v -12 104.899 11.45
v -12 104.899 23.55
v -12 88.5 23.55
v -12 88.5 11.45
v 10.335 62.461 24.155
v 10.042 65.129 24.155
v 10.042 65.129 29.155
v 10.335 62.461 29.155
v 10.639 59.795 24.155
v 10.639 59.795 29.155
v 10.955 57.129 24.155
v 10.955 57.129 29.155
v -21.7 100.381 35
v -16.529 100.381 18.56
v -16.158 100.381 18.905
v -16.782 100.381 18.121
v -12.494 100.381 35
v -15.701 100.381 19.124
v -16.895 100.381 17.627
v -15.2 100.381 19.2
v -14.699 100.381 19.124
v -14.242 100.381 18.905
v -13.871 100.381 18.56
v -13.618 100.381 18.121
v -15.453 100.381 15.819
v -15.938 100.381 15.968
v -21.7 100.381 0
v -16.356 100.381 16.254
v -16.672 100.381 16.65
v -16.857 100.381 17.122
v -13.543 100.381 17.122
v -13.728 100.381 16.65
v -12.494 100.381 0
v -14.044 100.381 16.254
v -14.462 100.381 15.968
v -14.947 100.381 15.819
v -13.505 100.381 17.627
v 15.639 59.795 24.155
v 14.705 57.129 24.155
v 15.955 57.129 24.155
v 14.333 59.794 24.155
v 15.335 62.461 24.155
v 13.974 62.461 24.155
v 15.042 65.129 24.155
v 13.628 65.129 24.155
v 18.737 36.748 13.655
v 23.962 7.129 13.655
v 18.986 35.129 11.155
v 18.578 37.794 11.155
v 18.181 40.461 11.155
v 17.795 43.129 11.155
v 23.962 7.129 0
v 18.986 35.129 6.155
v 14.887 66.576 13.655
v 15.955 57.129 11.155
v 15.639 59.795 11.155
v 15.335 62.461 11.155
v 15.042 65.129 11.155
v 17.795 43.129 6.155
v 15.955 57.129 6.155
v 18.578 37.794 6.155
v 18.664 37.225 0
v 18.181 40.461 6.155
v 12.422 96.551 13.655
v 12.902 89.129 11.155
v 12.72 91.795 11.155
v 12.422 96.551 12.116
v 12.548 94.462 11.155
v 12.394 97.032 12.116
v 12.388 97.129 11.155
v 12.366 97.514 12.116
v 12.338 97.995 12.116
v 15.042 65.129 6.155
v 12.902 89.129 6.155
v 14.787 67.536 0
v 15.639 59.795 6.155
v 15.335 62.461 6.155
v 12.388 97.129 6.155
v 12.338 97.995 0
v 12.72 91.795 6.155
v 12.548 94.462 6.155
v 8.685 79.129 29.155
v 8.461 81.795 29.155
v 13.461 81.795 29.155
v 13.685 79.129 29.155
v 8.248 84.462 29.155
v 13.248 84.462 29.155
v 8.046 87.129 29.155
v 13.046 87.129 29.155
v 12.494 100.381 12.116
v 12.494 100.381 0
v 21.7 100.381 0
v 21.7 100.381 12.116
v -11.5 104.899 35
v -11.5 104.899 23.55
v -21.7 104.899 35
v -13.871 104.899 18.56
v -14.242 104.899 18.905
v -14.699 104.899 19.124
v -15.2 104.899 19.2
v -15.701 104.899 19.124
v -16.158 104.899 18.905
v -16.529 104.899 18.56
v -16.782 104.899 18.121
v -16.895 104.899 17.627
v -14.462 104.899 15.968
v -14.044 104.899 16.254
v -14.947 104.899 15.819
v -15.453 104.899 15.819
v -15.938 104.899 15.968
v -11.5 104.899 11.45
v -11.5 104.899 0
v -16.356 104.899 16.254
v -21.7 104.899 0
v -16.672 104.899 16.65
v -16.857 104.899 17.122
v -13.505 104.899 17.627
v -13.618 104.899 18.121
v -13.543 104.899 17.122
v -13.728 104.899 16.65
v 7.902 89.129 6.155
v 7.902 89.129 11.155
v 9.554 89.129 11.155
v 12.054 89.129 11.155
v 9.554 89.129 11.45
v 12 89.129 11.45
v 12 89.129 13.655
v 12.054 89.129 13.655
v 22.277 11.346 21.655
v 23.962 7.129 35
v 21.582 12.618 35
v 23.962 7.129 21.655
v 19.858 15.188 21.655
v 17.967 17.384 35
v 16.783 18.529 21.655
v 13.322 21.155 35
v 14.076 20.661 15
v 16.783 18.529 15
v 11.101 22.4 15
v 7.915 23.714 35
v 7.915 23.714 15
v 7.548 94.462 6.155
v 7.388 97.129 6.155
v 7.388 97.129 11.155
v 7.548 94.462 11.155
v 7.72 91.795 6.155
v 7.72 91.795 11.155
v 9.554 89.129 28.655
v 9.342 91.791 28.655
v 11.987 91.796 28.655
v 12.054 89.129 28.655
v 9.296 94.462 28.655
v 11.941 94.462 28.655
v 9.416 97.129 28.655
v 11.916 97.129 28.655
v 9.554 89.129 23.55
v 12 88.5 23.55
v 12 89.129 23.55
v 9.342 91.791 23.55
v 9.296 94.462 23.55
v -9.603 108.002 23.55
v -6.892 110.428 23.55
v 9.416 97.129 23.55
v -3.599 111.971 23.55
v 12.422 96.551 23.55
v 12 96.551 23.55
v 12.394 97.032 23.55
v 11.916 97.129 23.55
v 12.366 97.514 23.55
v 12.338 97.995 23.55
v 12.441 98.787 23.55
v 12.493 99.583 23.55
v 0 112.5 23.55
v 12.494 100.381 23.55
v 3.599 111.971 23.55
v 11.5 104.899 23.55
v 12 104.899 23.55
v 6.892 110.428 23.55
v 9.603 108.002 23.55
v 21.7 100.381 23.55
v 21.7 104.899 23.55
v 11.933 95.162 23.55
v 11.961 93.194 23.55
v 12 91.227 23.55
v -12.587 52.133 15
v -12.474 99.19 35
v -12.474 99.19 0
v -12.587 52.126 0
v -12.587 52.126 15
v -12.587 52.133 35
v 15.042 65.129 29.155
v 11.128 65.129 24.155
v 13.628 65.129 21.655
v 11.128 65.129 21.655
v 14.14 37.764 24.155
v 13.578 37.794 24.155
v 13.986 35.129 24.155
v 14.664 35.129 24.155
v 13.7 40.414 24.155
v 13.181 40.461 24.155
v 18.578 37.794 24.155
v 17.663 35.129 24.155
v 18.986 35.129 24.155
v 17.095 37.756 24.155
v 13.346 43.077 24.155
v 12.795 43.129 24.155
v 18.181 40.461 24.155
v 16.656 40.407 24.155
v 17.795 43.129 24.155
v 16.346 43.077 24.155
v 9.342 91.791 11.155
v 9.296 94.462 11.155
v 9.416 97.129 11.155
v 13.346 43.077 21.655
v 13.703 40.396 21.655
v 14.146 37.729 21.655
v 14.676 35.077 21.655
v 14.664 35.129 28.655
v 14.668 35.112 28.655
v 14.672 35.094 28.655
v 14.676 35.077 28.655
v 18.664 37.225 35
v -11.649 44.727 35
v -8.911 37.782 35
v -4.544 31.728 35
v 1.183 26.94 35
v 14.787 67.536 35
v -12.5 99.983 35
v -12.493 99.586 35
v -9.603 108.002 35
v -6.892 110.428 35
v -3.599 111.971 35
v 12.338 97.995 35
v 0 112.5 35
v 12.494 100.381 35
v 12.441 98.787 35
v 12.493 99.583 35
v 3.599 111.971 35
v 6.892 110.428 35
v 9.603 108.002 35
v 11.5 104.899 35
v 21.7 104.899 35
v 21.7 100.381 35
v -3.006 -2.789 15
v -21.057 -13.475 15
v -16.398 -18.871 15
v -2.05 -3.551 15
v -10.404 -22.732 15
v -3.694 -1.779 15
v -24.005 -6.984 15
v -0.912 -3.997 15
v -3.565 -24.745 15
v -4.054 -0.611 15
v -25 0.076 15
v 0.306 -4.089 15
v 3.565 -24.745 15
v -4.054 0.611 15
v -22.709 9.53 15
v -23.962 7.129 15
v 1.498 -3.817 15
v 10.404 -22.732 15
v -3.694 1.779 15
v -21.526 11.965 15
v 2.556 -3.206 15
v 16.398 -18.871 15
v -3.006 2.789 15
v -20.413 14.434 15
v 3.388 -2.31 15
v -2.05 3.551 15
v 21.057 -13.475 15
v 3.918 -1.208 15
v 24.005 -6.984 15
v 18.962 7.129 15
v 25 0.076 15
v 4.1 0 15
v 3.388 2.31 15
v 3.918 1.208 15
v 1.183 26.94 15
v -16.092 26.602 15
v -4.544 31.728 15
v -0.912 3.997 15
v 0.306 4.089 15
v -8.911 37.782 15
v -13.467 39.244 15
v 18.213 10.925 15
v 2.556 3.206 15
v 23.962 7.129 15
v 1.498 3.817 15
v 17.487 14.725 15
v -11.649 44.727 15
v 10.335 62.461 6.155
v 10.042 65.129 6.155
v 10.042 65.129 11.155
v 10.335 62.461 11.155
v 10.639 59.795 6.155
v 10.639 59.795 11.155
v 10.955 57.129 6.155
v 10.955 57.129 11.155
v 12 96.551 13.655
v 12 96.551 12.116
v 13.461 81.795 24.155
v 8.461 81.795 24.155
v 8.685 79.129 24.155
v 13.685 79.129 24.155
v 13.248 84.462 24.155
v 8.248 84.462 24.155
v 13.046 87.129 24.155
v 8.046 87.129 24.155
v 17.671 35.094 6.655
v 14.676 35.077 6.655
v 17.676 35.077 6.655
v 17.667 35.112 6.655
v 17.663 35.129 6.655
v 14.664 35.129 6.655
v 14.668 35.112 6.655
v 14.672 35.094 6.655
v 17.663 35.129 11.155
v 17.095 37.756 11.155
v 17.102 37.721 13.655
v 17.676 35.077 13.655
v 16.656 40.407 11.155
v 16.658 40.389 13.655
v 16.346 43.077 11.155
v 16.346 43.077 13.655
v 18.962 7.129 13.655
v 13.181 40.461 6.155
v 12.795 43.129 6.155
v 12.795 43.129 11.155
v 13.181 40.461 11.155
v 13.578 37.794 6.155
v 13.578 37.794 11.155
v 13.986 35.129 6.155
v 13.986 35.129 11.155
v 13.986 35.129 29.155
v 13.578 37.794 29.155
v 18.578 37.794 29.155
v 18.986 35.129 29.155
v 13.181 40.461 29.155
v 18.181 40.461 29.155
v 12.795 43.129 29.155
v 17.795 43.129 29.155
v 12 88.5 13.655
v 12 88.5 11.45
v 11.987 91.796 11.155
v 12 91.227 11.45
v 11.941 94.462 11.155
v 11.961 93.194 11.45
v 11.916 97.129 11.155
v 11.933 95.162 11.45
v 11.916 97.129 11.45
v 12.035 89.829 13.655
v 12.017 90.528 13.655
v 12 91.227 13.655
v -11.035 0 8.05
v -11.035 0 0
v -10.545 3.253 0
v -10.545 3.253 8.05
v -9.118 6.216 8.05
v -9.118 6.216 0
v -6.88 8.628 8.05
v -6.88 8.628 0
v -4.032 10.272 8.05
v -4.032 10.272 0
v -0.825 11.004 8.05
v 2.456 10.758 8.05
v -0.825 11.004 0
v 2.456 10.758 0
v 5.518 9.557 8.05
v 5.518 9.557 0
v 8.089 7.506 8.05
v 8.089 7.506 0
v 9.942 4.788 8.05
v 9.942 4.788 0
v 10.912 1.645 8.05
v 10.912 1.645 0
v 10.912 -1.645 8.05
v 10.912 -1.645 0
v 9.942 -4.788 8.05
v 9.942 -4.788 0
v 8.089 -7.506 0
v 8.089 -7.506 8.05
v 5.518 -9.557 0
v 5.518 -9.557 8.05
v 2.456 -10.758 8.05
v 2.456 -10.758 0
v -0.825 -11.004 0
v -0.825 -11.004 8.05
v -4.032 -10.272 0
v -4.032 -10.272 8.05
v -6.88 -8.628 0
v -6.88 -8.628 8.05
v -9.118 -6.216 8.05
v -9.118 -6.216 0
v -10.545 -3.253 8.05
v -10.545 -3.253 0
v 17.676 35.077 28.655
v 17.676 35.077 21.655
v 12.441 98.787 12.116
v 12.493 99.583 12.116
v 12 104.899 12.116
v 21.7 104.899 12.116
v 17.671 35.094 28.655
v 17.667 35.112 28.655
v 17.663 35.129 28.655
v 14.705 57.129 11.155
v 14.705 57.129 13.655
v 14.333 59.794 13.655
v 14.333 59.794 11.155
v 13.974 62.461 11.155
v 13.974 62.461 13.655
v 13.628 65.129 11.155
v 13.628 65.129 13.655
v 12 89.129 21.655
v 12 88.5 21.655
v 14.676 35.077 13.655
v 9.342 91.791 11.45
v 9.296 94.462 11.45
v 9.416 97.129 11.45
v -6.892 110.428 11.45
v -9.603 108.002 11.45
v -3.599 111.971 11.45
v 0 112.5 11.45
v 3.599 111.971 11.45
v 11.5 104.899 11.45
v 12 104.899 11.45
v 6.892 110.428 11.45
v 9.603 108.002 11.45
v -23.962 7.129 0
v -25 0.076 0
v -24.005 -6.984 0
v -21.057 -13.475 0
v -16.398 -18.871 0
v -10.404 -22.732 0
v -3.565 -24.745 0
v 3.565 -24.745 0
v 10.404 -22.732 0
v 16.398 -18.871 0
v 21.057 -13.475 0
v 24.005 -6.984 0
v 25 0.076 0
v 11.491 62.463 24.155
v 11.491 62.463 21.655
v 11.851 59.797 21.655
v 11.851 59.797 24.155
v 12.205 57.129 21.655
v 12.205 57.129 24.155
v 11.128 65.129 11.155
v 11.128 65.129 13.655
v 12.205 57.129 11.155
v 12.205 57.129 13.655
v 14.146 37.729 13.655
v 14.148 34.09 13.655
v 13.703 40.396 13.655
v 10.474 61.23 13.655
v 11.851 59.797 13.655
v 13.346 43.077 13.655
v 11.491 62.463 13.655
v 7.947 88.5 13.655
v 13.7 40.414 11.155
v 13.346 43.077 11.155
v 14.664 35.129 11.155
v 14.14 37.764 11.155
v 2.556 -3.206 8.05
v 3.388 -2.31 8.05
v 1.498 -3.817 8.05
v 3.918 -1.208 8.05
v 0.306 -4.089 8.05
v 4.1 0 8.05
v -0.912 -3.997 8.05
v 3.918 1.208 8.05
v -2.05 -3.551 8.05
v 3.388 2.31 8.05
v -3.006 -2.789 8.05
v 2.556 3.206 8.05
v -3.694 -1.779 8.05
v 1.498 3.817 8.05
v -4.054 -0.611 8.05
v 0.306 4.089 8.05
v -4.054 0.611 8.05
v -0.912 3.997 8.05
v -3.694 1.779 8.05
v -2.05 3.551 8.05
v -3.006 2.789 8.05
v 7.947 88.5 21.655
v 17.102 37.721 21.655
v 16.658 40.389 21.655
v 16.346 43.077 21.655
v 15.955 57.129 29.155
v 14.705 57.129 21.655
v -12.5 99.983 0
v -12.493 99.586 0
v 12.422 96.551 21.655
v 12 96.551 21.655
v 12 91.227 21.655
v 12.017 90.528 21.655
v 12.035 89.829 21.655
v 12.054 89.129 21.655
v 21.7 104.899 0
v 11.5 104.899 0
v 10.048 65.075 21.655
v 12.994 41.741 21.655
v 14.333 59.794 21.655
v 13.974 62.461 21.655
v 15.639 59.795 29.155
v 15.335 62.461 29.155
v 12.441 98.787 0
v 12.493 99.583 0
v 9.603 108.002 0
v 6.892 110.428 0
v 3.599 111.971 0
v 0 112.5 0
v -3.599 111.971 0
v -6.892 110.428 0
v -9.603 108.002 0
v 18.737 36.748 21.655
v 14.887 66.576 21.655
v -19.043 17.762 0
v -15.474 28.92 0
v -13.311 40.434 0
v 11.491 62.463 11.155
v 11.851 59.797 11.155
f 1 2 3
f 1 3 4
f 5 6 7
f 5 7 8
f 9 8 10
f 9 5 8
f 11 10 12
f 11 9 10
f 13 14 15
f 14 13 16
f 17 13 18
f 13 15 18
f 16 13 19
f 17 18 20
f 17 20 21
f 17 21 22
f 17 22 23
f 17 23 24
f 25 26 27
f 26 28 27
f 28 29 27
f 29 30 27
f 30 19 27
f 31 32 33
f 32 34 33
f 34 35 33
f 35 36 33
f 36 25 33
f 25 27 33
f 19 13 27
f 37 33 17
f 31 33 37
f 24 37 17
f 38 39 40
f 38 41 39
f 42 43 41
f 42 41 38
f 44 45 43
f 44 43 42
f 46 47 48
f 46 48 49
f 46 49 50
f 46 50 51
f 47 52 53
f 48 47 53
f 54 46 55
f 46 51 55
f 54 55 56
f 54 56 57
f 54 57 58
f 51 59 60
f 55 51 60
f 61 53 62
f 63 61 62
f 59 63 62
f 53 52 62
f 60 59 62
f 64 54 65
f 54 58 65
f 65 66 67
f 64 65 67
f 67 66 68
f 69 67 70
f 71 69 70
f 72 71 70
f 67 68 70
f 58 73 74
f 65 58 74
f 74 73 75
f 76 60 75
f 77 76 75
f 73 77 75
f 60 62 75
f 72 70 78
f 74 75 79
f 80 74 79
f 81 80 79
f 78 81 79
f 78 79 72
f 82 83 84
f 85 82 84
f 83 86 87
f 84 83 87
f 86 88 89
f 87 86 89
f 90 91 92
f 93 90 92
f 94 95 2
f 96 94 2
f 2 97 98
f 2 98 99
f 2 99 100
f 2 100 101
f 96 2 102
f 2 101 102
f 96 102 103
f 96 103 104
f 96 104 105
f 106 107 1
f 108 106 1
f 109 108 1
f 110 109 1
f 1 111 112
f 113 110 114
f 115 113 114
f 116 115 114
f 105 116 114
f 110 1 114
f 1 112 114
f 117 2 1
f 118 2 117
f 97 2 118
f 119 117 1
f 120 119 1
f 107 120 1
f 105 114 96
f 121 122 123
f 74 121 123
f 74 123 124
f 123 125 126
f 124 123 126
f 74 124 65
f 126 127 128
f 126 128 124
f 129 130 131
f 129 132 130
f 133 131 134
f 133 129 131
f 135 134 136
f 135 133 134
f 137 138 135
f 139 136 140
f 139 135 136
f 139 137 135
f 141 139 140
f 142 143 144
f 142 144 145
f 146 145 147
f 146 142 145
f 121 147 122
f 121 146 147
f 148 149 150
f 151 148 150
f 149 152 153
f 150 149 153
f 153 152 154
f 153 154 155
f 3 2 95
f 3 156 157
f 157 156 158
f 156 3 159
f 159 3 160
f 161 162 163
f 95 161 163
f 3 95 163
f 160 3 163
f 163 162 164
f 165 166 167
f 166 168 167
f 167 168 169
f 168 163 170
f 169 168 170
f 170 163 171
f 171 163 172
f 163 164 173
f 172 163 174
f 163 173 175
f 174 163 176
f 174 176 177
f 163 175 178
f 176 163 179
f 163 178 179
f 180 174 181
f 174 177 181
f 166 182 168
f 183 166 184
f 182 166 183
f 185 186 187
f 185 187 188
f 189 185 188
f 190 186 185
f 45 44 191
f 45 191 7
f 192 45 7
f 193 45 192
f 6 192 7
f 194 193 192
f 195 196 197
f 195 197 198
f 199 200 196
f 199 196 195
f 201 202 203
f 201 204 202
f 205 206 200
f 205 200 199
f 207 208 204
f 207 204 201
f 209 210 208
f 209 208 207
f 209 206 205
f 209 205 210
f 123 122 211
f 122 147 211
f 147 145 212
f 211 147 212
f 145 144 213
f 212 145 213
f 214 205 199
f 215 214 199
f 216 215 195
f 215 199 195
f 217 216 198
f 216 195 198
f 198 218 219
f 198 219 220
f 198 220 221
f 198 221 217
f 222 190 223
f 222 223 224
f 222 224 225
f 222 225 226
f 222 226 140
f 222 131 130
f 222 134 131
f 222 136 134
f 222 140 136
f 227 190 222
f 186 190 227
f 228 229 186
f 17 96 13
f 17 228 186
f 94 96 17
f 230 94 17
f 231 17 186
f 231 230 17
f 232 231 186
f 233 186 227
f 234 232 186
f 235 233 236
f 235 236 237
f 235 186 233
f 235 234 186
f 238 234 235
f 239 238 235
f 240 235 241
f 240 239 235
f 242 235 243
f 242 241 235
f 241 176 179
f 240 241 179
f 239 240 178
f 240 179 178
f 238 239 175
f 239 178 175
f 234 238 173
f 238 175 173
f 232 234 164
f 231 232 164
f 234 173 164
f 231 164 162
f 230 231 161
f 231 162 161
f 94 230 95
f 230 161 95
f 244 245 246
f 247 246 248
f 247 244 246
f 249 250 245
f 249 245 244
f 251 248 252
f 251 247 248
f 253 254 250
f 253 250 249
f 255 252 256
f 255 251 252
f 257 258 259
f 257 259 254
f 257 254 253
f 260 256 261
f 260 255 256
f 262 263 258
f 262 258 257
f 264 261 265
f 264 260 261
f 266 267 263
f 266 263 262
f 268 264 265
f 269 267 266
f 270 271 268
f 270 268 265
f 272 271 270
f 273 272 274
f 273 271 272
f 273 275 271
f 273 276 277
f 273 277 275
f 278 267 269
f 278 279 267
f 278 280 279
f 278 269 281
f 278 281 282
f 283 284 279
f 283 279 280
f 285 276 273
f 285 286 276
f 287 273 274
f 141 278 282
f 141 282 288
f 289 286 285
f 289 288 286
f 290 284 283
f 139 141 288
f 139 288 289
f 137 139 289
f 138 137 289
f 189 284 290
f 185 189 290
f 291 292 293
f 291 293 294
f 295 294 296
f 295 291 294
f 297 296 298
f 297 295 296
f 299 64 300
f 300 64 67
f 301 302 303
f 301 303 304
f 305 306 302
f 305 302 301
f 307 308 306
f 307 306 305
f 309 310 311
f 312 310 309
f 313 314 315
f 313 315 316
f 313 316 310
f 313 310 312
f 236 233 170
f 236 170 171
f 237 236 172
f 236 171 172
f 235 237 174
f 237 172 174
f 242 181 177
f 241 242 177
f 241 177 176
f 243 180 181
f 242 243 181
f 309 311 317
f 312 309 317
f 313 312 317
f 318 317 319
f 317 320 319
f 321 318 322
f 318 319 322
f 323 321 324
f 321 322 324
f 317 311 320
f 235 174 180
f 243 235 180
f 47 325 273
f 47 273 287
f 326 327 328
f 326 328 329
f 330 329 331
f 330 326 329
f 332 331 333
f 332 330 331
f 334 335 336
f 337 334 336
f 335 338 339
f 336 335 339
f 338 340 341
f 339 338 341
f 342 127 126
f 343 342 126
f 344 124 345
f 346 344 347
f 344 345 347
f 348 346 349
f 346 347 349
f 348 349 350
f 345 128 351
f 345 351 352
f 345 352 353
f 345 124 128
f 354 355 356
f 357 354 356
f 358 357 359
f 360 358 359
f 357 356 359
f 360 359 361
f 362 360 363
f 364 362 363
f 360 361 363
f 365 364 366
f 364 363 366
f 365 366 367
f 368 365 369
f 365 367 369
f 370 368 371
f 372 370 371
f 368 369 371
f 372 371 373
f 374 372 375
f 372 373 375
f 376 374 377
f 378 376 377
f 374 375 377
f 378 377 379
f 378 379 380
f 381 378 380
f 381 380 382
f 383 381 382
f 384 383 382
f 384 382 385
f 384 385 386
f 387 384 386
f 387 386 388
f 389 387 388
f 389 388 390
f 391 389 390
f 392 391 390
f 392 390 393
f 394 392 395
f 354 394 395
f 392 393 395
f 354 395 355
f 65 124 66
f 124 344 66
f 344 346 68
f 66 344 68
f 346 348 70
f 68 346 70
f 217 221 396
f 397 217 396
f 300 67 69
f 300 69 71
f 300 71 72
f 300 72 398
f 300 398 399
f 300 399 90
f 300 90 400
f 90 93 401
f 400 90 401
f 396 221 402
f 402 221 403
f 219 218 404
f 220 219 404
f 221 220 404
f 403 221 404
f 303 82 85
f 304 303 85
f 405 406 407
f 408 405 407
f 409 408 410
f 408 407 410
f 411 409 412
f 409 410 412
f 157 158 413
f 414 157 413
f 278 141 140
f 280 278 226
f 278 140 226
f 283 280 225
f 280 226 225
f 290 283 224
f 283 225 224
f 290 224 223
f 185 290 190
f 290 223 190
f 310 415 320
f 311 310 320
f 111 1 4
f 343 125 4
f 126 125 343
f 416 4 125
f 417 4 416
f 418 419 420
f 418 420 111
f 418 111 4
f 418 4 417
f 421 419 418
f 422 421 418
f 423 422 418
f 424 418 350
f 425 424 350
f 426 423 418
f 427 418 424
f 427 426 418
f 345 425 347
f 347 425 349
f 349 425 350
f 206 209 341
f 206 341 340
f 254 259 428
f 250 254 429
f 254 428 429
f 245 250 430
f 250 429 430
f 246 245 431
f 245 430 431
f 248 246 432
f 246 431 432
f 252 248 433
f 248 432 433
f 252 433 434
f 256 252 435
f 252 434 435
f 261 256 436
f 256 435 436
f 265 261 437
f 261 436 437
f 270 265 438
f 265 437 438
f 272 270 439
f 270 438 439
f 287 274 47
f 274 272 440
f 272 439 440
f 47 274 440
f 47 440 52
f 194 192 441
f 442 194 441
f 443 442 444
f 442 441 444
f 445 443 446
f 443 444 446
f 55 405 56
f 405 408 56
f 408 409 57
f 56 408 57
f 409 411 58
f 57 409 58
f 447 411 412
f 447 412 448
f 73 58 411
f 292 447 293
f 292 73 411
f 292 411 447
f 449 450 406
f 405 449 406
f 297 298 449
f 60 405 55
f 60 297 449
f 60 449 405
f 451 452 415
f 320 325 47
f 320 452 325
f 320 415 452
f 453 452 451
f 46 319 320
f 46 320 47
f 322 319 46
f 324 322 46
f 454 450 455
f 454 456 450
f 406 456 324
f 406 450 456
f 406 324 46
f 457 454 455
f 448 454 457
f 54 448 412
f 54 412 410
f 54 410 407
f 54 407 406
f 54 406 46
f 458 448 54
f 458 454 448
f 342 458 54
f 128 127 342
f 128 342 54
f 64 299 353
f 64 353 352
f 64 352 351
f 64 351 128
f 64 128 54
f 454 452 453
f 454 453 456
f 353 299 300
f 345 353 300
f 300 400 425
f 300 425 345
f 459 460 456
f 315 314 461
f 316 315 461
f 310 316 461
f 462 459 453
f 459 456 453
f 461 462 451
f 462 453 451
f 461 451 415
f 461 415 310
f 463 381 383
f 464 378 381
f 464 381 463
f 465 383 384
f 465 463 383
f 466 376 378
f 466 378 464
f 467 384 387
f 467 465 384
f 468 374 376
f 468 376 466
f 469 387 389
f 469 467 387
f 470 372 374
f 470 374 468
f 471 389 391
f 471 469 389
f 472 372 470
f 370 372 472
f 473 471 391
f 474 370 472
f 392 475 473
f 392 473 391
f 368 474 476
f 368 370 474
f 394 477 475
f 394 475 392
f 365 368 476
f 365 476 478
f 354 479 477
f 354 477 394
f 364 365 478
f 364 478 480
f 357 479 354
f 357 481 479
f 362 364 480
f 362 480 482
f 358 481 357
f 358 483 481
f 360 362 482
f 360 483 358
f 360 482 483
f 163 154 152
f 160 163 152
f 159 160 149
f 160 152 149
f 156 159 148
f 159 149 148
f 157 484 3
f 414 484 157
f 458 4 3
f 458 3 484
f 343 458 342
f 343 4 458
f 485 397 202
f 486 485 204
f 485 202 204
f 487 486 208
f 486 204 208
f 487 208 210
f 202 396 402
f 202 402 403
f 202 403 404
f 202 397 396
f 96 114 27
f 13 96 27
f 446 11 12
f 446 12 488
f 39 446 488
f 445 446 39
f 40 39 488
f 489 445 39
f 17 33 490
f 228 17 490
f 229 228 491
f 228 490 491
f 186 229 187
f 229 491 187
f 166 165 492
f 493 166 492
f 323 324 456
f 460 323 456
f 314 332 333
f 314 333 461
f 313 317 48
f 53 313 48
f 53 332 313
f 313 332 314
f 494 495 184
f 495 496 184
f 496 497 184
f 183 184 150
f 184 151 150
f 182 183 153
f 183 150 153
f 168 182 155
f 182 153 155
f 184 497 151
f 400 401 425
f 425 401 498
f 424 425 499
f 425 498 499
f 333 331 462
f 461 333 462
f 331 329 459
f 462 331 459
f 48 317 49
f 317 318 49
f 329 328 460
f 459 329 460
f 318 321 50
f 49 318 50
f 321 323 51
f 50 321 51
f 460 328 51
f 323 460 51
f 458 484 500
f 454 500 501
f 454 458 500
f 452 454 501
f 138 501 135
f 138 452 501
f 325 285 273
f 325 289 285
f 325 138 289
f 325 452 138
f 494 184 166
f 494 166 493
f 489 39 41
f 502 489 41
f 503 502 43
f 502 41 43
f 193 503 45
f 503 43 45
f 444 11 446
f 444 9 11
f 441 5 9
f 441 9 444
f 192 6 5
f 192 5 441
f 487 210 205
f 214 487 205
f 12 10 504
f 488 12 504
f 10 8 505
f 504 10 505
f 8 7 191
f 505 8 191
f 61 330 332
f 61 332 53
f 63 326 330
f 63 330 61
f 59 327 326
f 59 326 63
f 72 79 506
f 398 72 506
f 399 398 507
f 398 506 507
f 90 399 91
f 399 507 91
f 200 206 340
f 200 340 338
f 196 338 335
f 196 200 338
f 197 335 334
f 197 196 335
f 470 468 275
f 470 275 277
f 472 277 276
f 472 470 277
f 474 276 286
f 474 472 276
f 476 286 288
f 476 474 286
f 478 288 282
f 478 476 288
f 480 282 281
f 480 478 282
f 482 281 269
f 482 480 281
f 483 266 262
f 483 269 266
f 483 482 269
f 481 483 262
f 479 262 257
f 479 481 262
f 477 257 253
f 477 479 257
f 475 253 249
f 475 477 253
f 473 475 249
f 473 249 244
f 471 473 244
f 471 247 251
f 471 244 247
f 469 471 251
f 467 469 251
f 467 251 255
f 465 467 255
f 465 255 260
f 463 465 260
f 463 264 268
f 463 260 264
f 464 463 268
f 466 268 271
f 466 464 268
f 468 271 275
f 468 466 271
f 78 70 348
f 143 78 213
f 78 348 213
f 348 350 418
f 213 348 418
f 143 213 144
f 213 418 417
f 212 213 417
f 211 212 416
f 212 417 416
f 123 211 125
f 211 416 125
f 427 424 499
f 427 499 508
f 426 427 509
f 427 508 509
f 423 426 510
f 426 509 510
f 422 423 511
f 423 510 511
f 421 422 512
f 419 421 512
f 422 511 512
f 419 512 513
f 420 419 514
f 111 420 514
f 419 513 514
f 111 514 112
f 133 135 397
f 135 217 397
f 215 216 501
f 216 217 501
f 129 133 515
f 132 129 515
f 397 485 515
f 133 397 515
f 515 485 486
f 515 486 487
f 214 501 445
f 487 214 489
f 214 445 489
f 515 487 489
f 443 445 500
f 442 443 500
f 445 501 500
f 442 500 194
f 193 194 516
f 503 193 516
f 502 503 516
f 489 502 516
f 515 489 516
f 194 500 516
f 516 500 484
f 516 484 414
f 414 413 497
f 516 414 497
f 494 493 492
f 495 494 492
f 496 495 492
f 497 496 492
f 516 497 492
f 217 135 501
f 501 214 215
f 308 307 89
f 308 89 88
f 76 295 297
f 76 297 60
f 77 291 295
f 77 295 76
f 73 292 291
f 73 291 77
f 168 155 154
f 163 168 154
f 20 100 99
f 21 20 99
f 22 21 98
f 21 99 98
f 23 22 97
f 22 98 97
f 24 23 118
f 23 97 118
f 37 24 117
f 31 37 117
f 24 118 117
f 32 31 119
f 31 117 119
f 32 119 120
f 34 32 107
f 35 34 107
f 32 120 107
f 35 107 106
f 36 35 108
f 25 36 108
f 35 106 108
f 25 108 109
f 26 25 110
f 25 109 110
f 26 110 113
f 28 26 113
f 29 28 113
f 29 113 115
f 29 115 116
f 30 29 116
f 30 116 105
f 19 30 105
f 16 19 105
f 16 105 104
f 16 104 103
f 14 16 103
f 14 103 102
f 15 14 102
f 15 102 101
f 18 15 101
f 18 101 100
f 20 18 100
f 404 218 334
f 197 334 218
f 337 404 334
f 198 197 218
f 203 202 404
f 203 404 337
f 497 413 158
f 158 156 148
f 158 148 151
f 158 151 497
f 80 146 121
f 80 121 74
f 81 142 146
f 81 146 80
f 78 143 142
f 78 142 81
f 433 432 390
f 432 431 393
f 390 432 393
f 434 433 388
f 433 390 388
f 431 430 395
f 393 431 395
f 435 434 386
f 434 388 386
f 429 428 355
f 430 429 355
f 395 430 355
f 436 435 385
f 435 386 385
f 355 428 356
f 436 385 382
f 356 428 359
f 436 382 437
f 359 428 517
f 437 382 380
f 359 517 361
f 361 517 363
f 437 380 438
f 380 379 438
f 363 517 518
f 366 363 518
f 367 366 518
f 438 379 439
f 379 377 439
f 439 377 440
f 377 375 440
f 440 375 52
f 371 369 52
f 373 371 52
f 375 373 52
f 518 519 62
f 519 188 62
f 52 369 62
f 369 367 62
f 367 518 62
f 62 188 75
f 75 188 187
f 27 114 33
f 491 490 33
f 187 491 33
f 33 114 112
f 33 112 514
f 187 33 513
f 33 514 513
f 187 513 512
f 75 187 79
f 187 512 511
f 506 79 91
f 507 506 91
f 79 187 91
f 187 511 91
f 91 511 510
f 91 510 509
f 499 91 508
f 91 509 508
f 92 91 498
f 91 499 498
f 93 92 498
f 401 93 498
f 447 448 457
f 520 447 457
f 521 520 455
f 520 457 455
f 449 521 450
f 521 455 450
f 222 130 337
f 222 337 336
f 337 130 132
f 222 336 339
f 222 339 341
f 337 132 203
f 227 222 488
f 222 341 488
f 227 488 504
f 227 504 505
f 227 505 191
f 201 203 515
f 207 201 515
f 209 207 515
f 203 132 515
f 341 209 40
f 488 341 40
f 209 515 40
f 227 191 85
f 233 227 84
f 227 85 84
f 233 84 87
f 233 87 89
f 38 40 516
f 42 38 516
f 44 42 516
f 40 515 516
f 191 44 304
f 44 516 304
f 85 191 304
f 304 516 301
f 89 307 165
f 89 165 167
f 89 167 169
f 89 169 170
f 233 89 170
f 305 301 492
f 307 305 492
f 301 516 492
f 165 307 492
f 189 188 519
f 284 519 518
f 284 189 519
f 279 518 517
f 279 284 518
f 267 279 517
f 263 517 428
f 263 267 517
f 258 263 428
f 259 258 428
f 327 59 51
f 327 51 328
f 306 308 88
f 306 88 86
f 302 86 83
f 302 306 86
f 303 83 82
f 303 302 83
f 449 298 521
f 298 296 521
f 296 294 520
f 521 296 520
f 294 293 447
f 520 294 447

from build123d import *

# Parameters (mm, degrees)
CROQUIS2_R                  = 4.1
SALIENTE_EXTRUIR1_DEPTH     = 35
CROQUIS3_W                  = 24
CROQUIS3_H                  = 12.1
CORTAR_EXTRUIR1_DEPTH       = 24
CROQUIS9_R                  = 1.7
CORTAR_EXTRUIR2_DEPTH       = 10
CORTAR_EXTRUIR3_START       = -10
CROQUIS11_R                 = 25
CORTAR_EXTRUIR3_DEPTH       = 10
CORTAR_EXTRUIR5_START       = 13.655231177
CORTAR_EXTRUIR5_DEPTH       = 8
CORTAR_EXTRUIR5_START_2     = 6.155231177
CORTAR_EXTRUIR5_2_DEPTH     = 5
CORTAR_EXTRUIR5_START_3     = 24.155231177
CORTAR_EXTRUIR5_3_DEPTH     = 5
CORTAR_EXTRUIR6_START       = -10
CROQUIS13_R                 = 25
CORTAR_EXTRUIR6_DEPTH       = 10
CROQUIS14_R                 = 11.035
CORTAR_EXTRUIR7_DEPTH       = 8.05
CORTAR_EXTRUIR8_DEPTH       = 15
CORTAR_EXTRUIR8_DEPTH_BACK  = 7
CORTAR_EXTRUIR9_DEPTH       = 15
CORTAR_EXTRUIR9_DEPTH_BACK  = 7
CORTAR_EXTRUIR10_DEPTH      = 15
CORTAR_EXTRUIR10_DEPTH_BACK = 7
CORTAR_EXTRUIR11_DEPTH      = 121.441894704
REDONDEO1_R                 = 30
CROQUIS22_W                 = 11.434183309
CROQUIS22_H                 = 8.348024574
CORTAR_EXTRUIR12_DEPTH      = 10


# Read off the part's stored shape, not the designer's step: Cortar-Extruir5
with BuildPart() as part:
    # Croquis2 → Saliente-Extruir1 (new body)
    with BuildSketch(Plane.XY):
        with BuildLine():
            Line((-11.5, 104.898979486), (-21.7, 104.898979486))
            Line((-21.7, 104.898979486), (-21.7, 100.380604651))
            Line((-21.7, 100.380604651), (-12.49420426, 100.380604651))
            ThreePointArc((-12.49420426, 100.380604651), (-12.498149406, 99.784915281), (-12.473709842, 99.189714392))
            ThreePointArc((-12.473709842, 99.189714392), (-16.573234399, 52.954310766), (-23.961892015, 7.129356989))
            ThreePointArc((-23.961892015, 7.129356989), (0, -25), (23.961892015, 7.129356989))
            ThreePointArc((23.961892015, 7.129356989), (16.547311175, 52.357383104), (12.33822575, 97.995458822))
            ThreePointArc((12.33822575, 97.995458822), (12.473356614, 99.184294915), (12.49420426, 100.380604651))
            Line((12.49420426, 100.380604651), (21.7, 100.380604651))
            Line((21.7, 100.380604651), (21.7, 104.898979486))
            Line((21.7, 104.898979486), (11.5, 104.898979486))
            ThreePointArc((11.5, 104.898979486), (0, 112.5), (-11.5, 104.898979486))
        make_face()
        Circle(CROQUIS2_R, mode=Mode.SUBTRACT)
    extrude(amount=SALIENTE_EXTRUIR1_DEPTH)

    # Croquis3 → Cortar-Extruir1 (cut)
    with BuildSketch(Plane(origin=(0, 112.5, 0), x_dir=(1, 0, 0), z_dir=(0, 1, 0))):
        with Locations((0, -17.5)):
            Rectangle(CROQUIS3_W, CROQUIS3_H)
    extrude(amount=-CORTAR_EXTRUIR1_DEPTH, mode=Mode.SUBTRACT)

    # Croquis9 → Cortar-Extruir2 (cut)
    with BuildSketch(Plane(origin=(0, 104.898979486, 0), x_dir=(1, 0, 0), z_dir=(0, 1, 0))):
        with Locations(Location((-15.2, -17.5, 0), (0, 0, 270))):
            Circle(CROQUIS9_R)
        with Locations(Location((15.2, -17.5, 0), (0, 0, 270))):
            Circle(CROQUIS9_R)
    extrude(amount=-CORTAR_EXTRUIR2_DEPTH, mode=Mode.SUBTRACT)

    # Croquis11 → Cortar-Extruir3 (cut)
    with BuildSketch(Plane.XY.offset(35).offset(CORTAR_EXTRUIR3_START)):
        Circle(CROQUIS11_R)
    extrude(amount=CORTAR_EXTRUIR3_DEPTH, mode=Mode.SUBTRACT)

    # Cortar-Extruir5 outline → Cortar-Extruir5 (cut)
    with BuildSketch(Plane.XY.offset(CORTAR_EXTRUIR5_START)):
        with BuildLine():
            Line((12.387970466, 97.129356989), (12, 97.129356989))
            Line((12, 97.129356989), (12, 88.5))
            Line((12, 88.5), (7.946995801, 88.5))
            ThreePointArc((7.946995801, 88.5), (12.16824242, 47.640569315), (18.961892015, 7.129356989))
            Line((18.961892015, 7.129356989), (23.961892015, 7.129356989))
            ThreePointArc((23.961892015, 7.129356989), (16.602493766, 51.9271429), (12.387970466, 97.129356989))
        make_face()
    extrude(amount=CORTAR_EXTRUIR5_DEPTH, mode=Mode.SUBTRACT)

    # Cortar-Extruir5 2 outline → Cortar-Extruir5 2 (cut)
    with BuildSketch(Plane.XY.offset(CORTAR_EXTRUIR5_START_2)):
        with BuildLine():
            ThreePointArc((12.902326037, 89.129356989), (12.63281503, 93.128564031), (12.387970466, 97.129356989))
            Line((12.387970466, 97.129356989), (7.387970466, 97.129356989))
            ThreePointArc((7.387970466, 97.129356989), (7.63281503, 93.128564031), (7.902326037, 89.129356989))
            Line((7.902326037, 89.129356989), (12.902326037, 89.129356989))
        make_face()
        with BuildLine():
            ThreePointArc((15.954808066, 57.129356989), (15.485901101, 61.127943182), (15.041769556, 65.129356989))
            Line((15.041769556, 65.129356989), (10.041769556, 65.129356989))
            ThreePointArc((10.041769556, 65.129356989), (10.485901101, 61.127943182), (10.954808066, 57.129356989))
            Line((10.954808066, 57.129356989), (15.954808066, 57.129356989))
        make_face()
        with BuildLine():
            ThreePointArc((18.985918027, 35.129356989), (18.378022509, 39.127504621), (17.795013863, 43.129356989))
            Line((17.795013863, 43.129356989), (12.795013863, 43.129356989))
            ThreePointArc((12.795013863, 43.129356989), (13.378022509, 39.127504621), (13.985918027, 35.129356989))
            Line((13.985918027, 35.129356989), (18.985918027, 35.129356989))
        make_face()
    extrude(amount=CORTAR_EXTRUIR5_2_DEPTH, mode=Mode.SUBTRACT)

    # Cortar-Extruir5 3 outline → Cortar-Extruir5 3 (cut)
    with BuildSketch(Plane.XY.offset(CORTAR_EXTRUIR5_START_3)):
        with BuildLine():
            ThreePointArc((13.684802762, 79.129356989), (13.35325681, 83.128371707), (13.046404729, 87.129356989))
            Line((13.046404729, 87.129356989), (8.046404729, 87.129356989))
            ThreePointArc((8.046404729, 87.129356989), (8.35325681, 83.128371707), (8.684802762, 79.129356989))
            Line((8.684802762, 79.129356989), (13.684802762, 79.129356989))
        make_face()
        with BuildLine():
            ThreePointArc((15.954808066, 57.129356989), (15.485901101, 61.127943182), (15.041769556, 65.129356989))
            Line((15.041769556, 65.129356989), (10.041769556, 65.129356989))
            ThreePointArc((10.041769556, 65.129356989), (10.485901101, 61.127943182), (10.954808066, 57.129356989))
            Line((10.954808066, 57.129356989), (15.954808066, 57.129356989))
        make_face()
        with BuildLine():
            ThreePointArc((18.985918027, 35.129356989), (18.378022509, 39.127504621), (17.795013863, 43.129356989))
            Line((17.795013863, 43.129356989), (12.795013863, 43.129356989))
            ThreePointArc((12.795013863, 43.129356989), (13.378022509, 39.127504621), (13.985918027, 35.129356989))
            Line((13.985918027, 35.129356989), (18.985918027, 35.129356989))
        make_face()
    extrude(amount=CORTAR_EXTRUIR5_3_DEPTH, mode=Mode.SUBTRACT)

    # Croquis13 → Cortar-Extruir6 (cut)
    with BuildSketch(Plane.XY.offset(25).offset(CORTAR_EXTRUIR6_START)):
        Circle(CROQUIS13_R)
    extrude(amount=CORTAR_EXTRUIR6_DEPTH, mode=Mode.SUBTRACT)

    # Croquis14 → Cortar-Extruir7 (cut)
    with BuildSketch(Plane(origin=(0, 0, 0), x_dir=(-1, 0, 0), z_dir=(0, 0, -1))):
        Circle(CROQUIS14_R)
    extrude(amount=-CORTAR_EXTRUIR7_DEPTH, mode=Mode.SUBTRACT)

    # Croquis16 → Cortar-Extruir8 (cut, two sides: drawn at the far end of the back side and taken through both)
    with BuildSketch(Plane(origin=(0, 0, 21.655231177), x_dir=(-1, 0, 0), z_dir=(0, 0, -1)).offset(-CORTAR_EXTRUIR8_DEPTH_BACK)):
        with BuildLine():
            Line((-13.627629456, 65.129356989), (-11.127629456, 65.129356989))
            ThreePointArc((-11.127629456, 65.129356989), (-11.671619883, 61.130083418), (-12.204820334, 57.129356989))
            Line((-12.204820334, 57.129356989), (-14.704820334, 57.129356989))
            ThreePointArc((-14.704820334, 57.129356989), (-14.1517613, 61.127409483), (-13.627629456, 65.129356989))
        make_face()
    extrude(amount=CORTAR_EXTRUIR8_DEPTH + CORTAR_EXTRUIR8_DEPTH_BACK, mode=Mode.SUBTRACT)

    # Croquis17 → Cortar-Extruir9 (cut, two sides: drawn at the far end of the back side and taken through both)
    with BuildSketch(Plane(origin=(0, 0, 21.655231177), x_dir=(-1, 0, 0), z_dir=(0, 0, -1)).offset(-CORTAR_EXTRUIR9_DEPTH_BACK)):
        with BuildLine():
            Line((-11.915557759, 97.129356989), (-9.415557759, 97.129356989))
            ThreePointArc((-9.415557759, 97.129356989), (-9.298046866, 93.126118397), (-9.554223154, 89.129356989))
            Line((-9.554223154, 89.129356989), (-12.054223154, 89.129356989))
            ThreePointArc((-12.054223154, 89.129356989), (-11.961814646, 93.128957012), (-11.915557759, 97.129356989))
        make_face()
    extrude(amount=CORTAR_EXTRUIR9_DEPTH + CORTAR_EXTRUIR9_DEPTH_BACK, mode=Mode.SUBTRACT)

    # Croquis18 → Cortar-Extruir10 (cut, two sides: drawn at the far end of the back side and taken through both)
    with BuildSketch(Plane(origin=(0, 0, 21.655231177), x_dir=(-1, 0, 0), z_dir=(0, 0, -1)).offset(-CORTAR_EXTRUIR10_DEPTH_BACK)):
        with BuildLine():
            Line((-16.345625555, 43.076723993), (-13.345625555, 43.076723993))
            ThreePointArc((-13.345625555, 43.076723993), (-13.91361536, 39.060592935), (-14.675658247, 35.076723993))
            Line((-14.675658247, 35.076723993), (-17.675658247, 35.076723993))
            ThreePointArc((-17.675658247, 35.076723993), (-16.863871756, 39.052322857), (-16.345625555, 43.076723993))
        make_face()
    extrude(amount=CORTAR_EXTRUIR10_DEPTH + CORTAR_EXTRUIR10_DEPTH_BACK, mode=Mode.SUBTRACT)

    # Croquis21 → Cortar-Extruir11 (cut, through all)
    with BuildSketch(Plane.XY.offset(35)):
        with BuildLine():
            Line((-12.473709842, 99.189714392), (-12.586604544, 52.126321873))
            ThreePointArc((-12.586604544, 52.126321873), (-15.474466118, 28.920051094), (-23.961892015, 7.129356989))
            Line((-23.961892015, 7.129356989), (-12.473709842, 99.189714392))
        make_face()
    extrude(amount=-CORTAR_EXTRUIR11_DEPTH, mode=Mode.SUBTRACT)

    # Redondeo1
    # the kernel refuses this fillet: 30 mm, written as the material it takes off along each edge
    with BuildSketch(Plane(origin=(-20.412546923, 14.433569486, 131.323871826), x_dir=(0.9503032831385696, 0.3113256655916044, 0), z_dir=(0, 0, -1))) as redondeo1_piece_1:
        with BuildLine():
            CenterArc((47.69462314, -24.085461873), REDONDEO1_R, 126.596996469, 71.521785283)
            ThreePointArc((19.182207947, -33.41510173), (11.30875316, -15.721520532), (0, 0))
            ThreePointArc((0, 0), (14.904569731, -4.928781773), (29.809139462, 0))
        make_face()
    extrude(amount=116.323871826, mode=Mode.SUBTRACT)

    # Croquis22 → Cortar-Extruir12 (cut)
    with BuildSketch(Plane(origin=(21.7, 0, 0), x_dir=(0, 0, -1), z_dir=(1, 0, 0))):
        with Locations((-17.832908346, 100.724967199)):
            Rectangle(CROQUIS22_W, CROQUIS22_H)
    extrude(amount=-CORTAR_EXTRUIR12_DEPTH, mode=Mode.SUBTRACT)


solid = part.part
